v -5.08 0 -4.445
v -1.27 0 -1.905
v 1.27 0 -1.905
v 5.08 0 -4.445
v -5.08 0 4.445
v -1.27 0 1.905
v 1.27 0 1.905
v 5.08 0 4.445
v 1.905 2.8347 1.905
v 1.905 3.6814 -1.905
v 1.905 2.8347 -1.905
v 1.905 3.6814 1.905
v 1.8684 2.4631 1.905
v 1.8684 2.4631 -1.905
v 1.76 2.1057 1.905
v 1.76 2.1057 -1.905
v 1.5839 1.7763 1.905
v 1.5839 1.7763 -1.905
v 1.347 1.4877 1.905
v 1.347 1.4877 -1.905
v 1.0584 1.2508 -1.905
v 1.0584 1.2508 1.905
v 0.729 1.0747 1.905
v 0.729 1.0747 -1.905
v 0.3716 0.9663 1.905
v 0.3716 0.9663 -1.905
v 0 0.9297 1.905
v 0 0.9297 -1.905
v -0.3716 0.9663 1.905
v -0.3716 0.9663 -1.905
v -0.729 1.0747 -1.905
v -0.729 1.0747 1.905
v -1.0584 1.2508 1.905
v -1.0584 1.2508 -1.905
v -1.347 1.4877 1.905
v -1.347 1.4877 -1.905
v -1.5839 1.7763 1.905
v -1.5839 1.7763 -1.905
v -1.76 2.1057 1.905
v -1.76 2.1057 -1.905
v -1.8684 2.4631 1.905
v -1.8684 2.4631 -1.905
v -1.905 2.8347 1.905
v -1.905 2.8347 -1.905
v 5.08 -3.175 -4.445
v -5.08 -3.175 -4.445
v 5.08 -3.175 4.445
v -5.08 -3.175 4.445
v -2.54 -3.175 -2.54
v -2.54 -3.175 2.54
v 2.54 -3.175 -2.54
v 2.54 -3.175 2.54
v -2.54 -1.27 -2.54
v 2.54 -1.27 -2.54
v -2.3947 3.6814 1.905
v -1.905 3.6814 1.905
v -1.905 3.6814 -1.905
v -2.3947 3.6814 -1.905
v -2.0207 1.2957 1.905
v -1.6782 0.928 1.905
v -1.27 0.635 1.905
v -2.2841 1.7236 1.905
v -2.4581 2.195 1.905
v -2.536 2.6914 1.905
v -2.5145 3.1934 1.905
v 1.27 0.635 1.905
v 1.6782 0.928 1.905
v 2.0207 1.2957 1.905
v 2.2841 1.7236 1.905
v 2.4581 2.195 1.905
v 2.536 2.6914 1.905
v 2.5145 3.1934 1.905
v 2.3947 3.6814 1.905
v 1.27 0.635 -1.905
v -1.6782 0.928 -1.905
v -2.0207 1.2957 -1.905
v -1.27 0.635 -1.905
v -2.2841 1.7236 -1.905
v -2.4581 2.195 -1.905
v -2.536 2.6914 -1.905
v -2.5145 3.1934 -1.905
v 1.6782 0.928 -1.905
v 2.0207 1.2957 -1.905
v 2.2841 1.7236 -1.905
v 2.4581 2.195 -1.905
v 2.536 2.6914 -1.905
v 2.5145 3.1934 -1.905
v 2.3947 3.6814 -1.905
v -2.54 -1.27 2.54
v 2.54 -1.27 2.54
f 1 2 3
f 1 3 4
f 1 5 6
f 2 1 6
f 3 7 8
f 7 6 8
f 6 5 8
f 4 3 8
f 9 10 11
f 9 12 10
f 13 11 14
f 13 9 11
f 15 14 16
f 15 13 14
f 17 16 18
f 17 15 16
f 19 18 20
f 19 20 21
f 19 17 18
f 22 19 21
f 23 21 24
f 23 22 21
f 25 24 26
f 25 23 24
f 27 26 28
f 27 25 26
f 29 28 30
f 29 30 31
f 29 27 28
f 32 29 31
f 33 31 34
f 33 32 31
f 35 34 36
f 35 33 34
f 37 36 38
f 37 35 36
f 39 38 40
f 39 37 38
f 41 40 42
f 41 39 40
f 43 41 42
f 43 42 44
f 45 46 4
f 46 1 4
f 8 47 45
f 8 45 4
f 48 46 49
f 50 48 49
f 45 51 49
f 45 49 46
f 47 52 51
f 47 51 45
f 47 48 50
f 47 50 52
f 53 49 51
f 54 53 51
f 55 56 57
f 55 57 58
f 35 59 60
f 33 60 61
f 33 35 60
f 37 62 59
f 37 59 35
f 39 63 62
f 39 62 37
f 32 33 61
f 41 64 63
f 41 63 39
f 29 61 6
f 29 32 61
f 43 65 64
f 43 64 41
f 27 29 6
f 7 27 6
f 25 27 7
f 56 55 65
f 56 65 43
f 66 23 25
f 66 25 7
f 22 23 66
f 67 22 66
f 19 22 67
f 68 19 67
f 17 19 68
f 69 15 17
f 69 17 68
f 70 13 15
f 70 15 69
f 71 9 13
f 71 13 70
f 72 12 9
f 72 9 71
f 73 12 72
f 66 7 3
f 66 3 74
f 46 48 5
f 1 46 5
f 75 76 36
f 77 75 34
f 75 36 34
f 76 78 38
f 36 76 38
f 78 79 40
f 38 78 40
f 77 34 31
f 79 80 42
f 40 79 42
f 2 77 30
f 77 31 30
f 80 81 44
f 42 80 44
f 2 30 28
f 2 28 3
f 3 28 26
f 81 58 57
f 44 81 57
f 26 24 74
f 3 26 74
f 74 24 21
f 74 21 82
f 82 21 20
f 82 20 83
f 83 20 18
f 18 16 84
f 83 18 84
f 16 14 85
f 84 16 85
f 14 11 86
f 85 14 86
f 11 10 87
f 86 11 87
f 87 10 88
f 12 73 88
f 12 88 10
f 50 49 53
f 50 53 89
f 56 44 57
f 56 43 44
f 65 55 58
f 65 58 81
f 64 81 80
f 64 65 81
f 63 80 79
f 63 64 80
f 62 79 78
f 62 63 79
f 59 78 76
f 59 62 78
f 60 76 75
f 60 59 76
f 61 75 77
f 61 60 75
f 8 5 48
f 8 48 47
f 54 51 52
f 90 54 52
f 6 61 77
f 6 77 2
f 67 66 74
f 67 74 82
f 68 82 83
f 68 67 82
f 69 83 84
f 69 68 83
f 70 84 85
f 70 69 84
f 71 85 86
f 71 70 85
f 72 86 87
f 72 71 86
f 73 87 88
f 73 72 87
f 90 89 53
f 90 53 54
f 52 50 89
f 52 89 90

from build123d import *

# Parameters (mm, degrees)
SKETCH1_W           = 10.16
SKETCH1_H           = 3.175
BOSS_EXTRUDE1_DEPTH = 4.445
BOSS_EXTRUDE2_DEPTH = 1.905
SKETCH3_OUTSIDE_W   = 15.188
SKETCH3_OUTSIDE_H   = 13.918
SKETCH3_OUTSIDE_W_2 = 10.16
SKETCH3_OUTSIDE_H_2 = 8.89
SKETCH3_OUTSIDE_W_3 = 5.08
SKETCH3_OUTSIDE_H_3 = 5.08
CUT_EXTRUDE1_DEPTH  = 1.905


with BuildPart() as part:
    # Sketch1 → Boss-Extrude1 (new body, symmetric)
    with BuildSketch(Plane.XY):
        with Locations((0, -1.5875)):
            Rectangle(SKETCH1_W, SKETCH1_H)
    extrude(amount=BOSS_EXTRUDE1_DEPTH, both=True)

    # Sketch2 → Boss-Extrude2 (add, symmetric)
    with BuildSketch(Plane.XY):
        with BuildLine():
            Line((-1.905, 2.834704526), (-1.905, 3.681371192))
            Line((-1.905, 3.681371192), (-2.394734966, 3.681371192))
            ThreePointArc((-2.394734966, 3.681371192), (-2.382785125, 1.954968743), (-1.27, 0.635))
            Line((-1.27, 0.635), (-1.27, 0))
            Line((-1.27, 0), (1.27, 0))
            Line((1.27, 0), (1.27, 0.635))
            ThreePointArc((1.27, 0.635), (2.382785125, 1.954968743), (2.394734966, 3.681371192))
            Line((2.394734966, 3.681371192), (1.905, 3.681371192))
            Line((1.905, 3.681371192), (1.905, 2.834704526))
            ThreePointArc((1.905, 2.834704526), (0, 0.929704526), (-1.905, 2.834704526))
        make_face()
    extrude(amount=BOSS_EXTRUDE2_DEPTH, both=True)

    # Sketch3 outside → Cut-Extrude1 (cut)
    with BuildSketch(Plane.XZ.offset(3.175)):
        Rectangle(SKETCH3_OUTSIDE_W, SKETCH3_OUTSIDE_H)
        Rectangle(SKETCH3_OUTSIDE_W_2, SKETCH3_OUTSIDE_H_2, mode=Mode.SUBTRACT)
        Rectangle(SKETCH3_OUTSIDE_W_3, SKETCH3_OUTSIDE_H_3)
    extrude(amount=-CUT_EXTRUDE1_DEPTH, mode=Mode.SUBTRACT)


solid = part.part
